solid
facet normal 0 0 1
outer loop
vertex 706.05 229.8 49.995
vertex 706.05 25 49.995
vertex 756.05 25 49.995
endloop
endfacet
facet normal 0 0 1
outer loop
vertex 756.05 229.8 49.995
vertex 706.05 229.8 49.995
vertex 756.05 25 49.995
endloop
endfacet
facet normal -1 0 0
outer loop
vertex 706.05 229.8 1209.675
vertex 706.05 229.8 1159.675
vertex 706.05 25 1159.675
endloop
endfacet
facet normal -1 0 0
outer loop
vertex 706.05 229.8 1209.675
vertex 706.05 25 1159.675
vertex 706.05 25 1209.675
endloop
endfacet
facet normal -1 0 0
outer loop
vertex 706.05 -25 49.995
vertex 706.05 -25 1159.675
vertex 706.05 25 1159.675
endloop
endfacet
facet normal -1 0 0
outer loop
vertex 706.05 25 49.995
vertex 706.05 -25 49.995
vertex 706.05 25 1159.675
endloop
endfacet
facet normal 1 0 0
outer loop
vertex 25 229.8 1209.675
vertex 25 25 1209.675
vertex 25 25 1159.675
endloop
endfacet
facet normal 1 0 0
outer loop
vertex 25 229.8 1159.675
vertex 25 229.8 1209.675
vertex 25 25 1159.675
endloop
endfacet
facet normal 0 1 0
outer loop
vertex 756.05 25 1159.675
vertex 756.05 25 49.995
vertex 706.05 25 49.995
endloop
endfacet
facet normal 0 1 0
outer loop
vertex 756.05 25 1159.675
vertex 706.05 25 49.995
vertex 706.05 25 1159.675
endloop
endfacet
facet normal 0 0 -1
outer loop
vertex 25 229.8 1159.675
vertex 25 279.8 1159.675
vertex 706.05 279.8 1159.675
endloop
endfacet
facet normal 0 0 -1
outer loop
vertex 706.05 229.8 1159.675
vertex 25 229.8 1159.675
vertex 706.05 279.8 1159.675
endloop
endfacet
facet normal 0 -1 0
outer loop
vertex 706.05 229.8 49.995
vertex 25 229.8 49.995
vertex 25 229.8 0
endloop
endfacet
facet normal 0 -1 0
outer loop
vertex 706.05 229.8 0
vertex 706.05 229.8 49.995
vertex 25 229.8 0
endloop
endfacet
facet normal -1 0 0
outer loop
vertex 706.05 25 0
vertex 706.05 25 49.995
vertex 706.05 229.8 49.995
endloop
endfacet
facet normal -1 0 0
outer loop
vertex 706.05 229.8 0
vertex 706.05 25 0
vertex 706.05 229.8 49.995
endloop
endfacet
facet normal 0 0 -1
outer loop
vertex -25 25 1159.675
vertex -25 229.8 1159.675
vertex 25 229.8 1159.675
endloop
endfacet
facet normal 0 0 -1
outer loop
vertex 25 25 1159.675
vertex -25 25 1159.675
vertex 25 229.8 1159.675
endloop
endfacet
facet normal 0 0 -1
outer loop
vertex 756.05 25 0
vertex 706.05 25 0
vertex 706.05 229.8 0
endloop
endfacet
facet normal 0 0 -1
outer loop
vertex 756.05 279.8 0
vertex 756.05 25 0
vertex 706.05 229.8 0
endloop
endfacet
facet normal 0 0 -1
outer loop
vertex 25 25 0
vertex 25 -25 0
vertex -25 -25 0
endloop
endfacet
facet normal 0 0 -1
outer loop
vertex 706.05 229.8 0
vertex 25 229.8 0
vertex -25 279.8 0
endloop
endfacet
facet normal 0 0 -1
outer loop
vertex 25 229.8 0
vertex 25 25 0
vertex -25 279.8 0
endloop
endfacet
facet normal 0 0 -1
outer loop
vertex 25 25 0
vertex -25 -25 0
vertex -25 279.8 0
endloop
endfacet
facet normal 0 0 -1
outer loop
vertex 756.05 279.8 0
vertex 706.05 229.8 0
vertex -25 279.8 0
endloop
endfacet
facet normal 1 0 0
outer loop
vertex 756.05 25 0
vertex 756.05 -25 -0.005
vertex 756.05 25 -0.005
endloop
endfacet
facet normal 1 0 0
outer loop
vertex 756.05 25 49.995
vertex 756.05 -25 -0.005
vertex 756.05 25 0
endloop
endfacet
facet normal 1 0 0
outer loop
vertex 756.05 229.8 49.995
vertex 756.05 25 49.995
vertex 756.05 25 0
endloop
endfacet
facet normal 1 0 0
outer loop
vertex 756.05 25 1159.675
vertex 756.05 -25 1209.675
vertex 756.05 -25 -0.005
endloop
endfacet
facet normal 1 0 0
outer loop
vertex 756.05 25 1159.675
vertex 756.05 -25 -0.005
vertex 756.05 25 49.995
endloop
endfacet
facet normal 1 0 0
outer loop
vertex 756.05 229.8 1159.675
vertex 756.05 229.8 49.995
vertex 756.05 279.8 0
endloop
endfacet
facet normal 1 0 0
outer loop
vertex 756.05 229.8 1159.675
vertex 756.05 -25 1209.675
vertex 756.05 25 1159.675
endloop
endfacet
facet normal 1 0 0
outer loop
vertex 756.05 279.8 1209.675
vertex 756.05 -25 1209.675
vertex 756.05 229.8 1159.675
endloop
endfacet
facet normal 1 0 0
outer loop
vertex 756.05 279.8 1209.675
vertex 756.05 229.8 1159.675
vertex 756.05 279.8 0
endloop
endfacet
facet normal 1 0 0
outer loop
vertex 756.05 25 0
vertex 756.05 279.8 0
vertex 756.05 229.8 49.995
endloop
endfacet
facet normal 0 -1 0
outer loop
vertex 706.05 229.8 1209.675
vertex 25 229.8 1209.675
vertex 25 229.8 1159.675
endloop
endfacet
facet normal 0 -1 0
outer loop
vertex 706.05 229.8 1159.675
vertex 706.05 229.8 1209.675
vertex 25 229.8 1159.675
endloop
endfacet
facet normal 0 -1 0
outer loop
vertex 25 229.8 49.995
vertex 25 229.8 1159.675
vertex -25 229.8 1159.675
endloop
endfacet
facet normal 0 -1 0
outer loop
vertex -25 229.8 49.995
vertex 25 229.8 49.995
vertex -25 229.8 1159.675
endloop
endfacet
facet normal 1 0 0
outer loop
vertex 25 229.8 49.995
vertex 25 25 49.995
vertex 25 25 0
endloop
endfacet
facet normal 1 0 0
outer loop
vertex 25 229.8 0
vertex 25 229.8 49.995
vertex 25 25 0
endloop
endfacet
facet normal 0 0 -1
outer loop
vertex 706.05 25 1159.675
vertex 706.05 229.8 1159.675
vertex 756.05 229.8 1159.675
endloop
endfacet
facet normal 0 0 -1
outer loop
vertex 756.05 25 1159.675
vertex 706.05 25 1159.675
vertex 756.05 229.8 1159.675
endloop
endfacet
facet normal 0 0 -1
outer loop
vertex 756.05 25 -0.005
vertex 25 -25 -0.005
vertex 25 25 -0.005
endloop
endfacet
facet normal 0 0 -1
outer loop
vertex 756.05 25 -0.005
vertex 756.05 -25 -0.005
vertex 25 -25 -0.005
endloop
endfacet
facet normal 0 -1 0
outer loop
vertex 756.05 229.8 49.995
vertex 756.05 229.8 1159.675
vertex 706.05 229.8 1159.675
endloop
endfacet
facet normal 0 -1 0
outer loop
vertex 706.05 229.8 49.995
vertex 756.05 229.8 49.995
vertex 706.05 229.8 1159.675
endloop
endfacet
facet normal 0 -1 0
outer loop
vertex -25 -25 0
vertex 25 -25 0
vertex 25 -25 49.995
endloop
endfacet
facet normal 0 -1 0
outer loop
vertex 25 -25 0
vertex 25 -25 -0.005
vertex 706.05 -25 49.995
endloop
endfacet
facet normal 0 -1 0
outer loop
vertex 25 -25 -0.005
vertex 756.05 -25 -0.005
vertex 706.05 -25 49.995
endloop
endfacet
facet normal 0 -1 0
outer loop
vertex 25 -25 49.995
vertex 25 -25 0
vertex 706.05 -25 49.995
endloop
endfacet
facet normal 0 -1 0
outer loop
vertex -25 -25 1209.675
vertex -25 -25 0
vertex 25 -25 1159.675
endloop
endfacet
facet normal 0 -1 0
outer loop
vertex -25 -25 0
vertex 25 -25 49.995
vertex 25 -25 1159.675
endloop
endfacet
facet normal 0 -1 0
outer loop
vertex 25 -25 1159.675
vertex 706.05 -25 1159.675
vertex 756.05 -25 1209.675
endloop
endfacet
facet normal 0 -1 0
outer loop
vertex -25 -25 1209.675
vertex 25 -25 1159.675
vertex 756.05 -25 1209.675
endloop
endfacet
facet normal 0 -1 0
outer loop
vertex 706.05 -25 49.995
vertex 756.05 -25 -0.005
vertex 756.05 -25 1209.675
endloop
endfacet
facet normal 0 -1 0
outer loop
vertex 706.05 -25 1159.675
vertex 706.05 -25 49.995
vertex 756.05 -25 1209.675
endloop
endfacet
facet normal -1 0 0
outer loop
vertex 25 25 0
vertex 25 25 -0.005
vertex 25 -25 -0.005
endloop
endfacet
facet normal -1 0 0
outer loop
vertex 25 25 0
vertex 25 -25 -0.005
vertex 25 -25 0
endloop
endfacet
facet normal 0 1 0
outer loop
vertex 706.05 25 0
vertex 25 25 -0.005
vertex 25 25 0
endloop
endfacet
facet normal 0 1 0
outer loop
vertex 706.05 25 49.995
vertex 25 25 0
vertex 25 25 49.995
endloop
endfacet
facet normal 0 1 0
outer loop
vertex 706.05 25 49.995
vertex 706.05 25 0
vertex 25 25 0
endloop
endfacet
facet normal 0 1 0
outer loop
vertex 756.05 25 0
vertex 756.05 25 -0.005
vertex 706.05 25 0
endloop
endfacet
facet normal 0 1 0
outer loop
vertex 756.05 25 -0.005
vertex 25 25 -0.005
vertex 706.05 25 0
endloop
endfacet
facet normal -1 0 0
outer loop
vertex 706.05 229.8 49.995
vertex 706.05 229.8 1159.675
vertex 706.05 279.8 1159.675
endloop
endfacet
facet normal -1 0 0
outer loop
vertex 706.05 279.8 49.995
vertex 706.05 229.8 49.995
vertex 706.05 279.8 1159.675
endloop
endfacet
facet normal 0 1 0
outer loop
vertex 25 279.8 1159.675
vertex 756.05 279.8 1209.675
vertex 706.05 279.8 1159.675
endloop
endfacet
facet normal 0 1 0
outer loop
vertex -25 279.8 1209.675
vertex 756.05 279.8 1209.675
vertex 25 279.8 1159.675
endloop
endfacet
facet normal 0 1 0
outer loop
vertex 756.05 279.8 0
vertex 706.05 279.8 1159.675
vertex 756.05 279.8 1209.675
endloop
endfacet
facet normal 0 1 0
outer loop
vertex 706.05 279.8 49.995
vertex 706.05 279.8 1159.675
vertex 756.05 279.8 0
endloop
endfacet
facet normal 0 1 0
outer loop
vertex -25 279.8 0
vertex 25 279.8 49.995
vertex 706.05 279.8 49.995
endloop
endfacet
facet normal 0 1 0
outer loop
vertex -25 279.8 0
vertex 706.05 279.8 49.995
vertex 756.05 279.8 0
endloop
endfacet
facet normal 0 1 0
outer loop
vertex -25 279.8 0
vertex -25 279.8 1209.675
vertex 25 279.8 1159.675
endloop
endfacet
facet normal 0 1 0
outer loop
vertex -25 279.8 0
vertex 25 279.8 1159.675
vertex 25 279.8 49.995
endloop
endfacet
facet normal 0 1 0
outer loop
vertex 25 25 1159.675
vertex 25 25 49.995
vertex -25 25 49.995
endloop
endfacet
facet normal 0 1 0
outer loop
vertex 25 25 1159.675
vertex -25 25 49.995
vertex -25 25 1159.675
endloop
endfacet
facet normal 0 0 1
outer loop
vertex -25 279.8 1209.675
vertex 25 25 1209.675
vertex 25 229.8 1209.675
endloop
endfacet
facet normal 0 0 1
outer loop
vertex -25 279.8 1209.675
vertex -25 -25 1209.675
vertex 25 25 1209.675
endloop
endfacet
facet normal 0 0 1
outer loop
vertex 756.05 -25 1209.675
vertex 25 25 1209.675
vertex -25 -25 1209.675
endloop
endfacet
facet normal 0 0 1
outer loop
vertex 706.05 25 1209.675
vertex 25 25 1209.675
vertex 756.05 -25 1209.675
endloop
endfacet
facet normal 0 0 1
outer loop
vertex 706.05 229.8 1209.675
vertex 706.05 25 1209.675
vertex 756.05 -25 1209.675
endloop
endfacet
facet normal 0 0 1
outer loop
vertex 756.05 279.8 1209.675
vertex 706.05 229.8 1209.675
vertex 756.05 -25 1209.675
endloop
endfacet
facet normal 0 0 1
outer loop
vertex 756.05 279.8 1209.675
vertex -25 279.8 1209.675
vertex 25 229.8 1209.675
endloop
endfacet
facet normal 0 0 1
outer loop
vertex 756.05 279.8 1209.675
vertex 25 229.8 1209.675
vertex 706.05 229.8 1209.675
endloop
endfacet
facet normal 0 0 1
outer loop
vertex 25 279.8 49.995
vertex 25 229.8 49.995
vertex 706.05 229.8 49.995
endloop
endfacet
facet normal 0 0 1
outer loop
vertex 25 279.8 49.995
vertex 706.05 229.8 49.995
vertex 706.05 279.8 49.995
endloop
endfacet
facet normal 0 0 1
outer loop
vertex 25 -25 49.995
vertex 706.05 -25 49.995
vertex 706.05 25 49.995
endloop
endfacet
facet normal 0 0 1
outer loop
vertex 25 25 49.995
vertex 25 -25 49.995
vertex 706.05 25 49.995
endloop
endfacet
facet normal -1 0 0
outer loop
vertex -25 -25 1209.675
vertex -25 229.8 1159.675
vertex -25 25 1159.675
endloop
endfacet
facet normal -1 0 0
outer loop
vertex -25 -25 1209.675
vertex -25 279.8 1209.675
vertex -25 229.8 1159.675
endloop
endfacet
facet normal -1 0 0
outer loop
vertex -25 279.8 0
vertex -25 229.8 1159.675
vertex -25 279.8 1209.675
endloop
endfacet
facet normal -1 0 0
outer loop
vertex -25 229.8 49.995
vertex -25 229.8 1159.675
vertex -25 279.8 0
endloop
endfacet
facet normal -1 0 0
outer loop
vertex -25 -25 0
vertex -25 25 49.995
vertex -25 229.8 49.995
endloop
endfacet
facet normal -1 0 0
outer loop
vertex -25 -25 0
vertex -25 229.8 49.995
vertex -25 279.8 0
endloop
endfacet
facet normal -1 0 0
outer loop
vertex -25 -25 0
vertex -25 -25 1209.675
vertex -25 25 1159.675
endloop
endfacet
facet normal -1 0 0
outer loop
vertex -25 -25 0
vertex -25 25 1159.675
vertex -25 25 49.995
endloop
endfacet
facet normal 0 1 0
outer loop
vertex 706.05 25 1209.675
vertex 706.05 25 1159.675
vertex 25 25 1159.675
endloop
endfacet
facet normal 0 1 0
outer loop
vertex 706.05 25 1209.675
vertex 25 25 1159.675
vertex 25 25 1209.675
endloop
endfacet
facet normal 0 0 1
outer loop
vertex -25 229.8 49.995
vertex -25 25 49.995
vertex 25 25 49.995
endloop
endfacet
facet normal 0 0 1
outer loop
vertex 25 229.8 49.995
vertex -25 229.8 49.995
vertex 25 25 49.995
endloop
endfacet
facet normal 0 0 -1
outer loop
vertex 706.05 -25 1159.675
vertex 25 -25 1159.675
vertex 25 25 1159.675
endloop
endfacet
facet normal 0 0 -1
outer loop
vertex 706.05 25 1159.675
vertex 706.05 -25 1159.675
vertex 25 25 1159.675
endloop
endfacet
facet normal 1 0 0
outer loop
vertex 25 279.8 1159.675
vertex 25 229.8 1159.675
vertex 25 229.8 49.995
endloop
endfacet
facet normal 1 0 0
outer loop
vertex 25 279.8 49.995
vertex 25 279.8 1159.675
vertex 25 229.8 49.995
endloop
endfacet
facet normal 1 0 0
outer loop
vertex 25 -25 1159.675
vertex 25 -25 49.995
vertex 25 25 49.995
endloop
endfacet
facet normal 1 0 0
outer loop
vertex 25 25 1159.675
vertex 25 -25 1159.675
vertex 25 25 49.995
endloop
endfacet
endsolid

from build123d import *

# Parameters (mm, degrees)
SKETCH2_W            = 50
SKETCH2_H            = 50
BOSS_EXTRUDE1_DEPTH  = 1209.675
SKETCH3_W            = 50
SKETCH3_H            = 50
BOSS_EXTRUDE2_DEPTH  = 731.05
SKETCH4_W            = 50
SKETCH4_H            = 50
BOSS_EXTRUDE3_DEPTH  = 1159.68
SKETCH6_W            = 50
SKETCH6_H            = 50
BOSS_EXTRUDE4_DEPTH  = 681.05
SKETCH8_W            = 50
SKETCH8_H            = 50
BOSS_EXTRUDE5_DEPTH  = 254.8
SKETCH9_W            = 50
SKETCH9_H            = 50
BOSS_EXTRUDE6_DEPTH  = 731.05
SKETCH10_W           = 50
SKETCH10_H           = 50
BOSS_EXTRUDE7_DEPTH  = 204.8
SKETCH11_W           = 50
SKETCH11_H           = 49.995
BOSS_EXTRUDE8_DEPTH  = 254.8
SKETCH12_W           = 50
SKETCH12_H           = 50
BOSS_EXTRUDE9_DEPTH  = 1109.8
SKETCH13_W           = 50
SKETCH13_H           = 50
BOSS_EXTRUDE10_DEPTH = 1109.8
SKETCH14_W           = 50
SKETCH14_H           = 49.995
BOSS_EXTRUDE11_DEPTH = 254.8
SKETCH15_W           = 49.995
SKETCH15_H           = 50
BOSS_EXTRUDE12_DEPTH = 681.05


with BuildPart() as part:
    # Sketch2 → Boss-Extrude1 (new body)
    with BuildSketch(Plane.XY):
        Rectangle(SKETCH2_W, SKETCH2_H)
    extrude(amount=BOSS_EXTRUDE1_DEPTH)

    # Sketch3 → Boss-Extrude2 (add)
    with BuildSketch(Plane(origin=(25, 0, 0), x_dir=(0, 0, -1), z_dir=(1, 0, 0))):
        with Locations((-1184.675, 0)):
            Rectangle(SKETCH3_W, SKETCH3_H)
    extrude(amount=BOSS_EXTRUDE2_DEPTH)

    # Sketch4 → Boss-Extrude3 (add)
    with BuildSketch(Plane(origin=(0, 0, 1159.675), x_dir=(-1, 0, 0), z_dir=(0, 0, -1))):
        with Locations((-731.05, 0)):
            Rectangle(SKETCH4_W, SKETCH4_H)
    extrude(amount=BOSS_EXTRUDE3_DEPTH)

    # Sketch6 → Boss-Extrude4 (add)
    with BuildSketch(Plane.ZY.offset(-706.05)):
        with Locations((24.995, 0)):
            Rectangle(SKETCH6_W, SKETCH6_H)
    extrude(amount=BOSS_EXTRUDE4_DEPTH)

    # Sketch8 → Boss-Extrude5 (add)
    with BuildSketch(Plane(origin=(0, 25, 0), x_dir=(1, 0, 0), z_dir=(0, 1, 0))):
        with Locations((0, -1184.675)):
            Rectangle(SKETCH8_W, SKETCH8_H)
    extrude(amount=BOSS_EXTRUDE5_DEPTH)

    # Sketch9 → Boss-Extrude6 (add)
    with BuildSketch(Plane(origin=(25, 0, 0), x_dir=(0, 0, -1), z_dir=(1, 0, 0))):
        with Locations((-1184.675, 254.8)):
            Rectangle(SKETCH9_W, SKETCH9_H)
    extrude(amount=BOSS_EXTRUDE6_DEPTH)

    # Sketch10 → Boss-Extrude7 (add)
    with BuildSketch(Plane.XZ.offset(-229.8)):
        with Locations((731.05, 1184.675)):
            Rectangle(SKETCH10_W, SKETCH10_H)
    extrude(amount=BOSS_EXTRUDE7_DEPTH)

    # Sketch11 → Boss-Extrude8 (add)
    with BuildSketch(Plane(origin=(0, 25, 0), x_dir=(1, 0, 0), z_dir=(0, 1, 0))):
        with Locations((731.05, -24.9975)):
            Rectangle(SKETCH11_W, SKETCH11_H)
    extrude(amount=BOSS_EXTRUDE8_DEPTH)

    # Sketch12 → Boss-Extrude9 (add)
    with BuildSketch(Plane(origin=(0, 0, 1159.675), x_dir=(-1, 0, 0), z_dir=(0, 0, -1))):
        with Locations((-731.05, 254.8)):
            Rectangle(SKETCH12_W, SKETCH12_H)
    extrude(amount=BOSS_EXTRUDE9_DEPTH)

    # Sketch13 → Boss-Extrude10 (add)
    with BuildSketch(Plane(origin=(0, 0, 1159.675), x_dir=(-1, 0, 0), z_dir=(0, 0, -1))):
        with Locations((0, 254.8)):
            Rectangle(SKETCH13_W, SKETCH13_H)
    extrude(amount=BOSS_EXTRUDE10_DEPTH)

    # Sketch14 → Boss-Extrude11 (add)
    with BuildSketch(Plane(origin=(0, 25, 0), x_dir=(1, 0, 0), z_dir=(0, 1, 0))):
        with Locations((0, -24.9975)):
            Rectangle(SKETCH14_W, SKETCH14_H)
    extrude(amount=BOSS_EXTRUDE11_DEPTH)

    # Sketch15 → Boss-Extrude12 (add)
    with BuildSketch(Plane(origin=(25, 0, 0), x_dir=(0, 0, -1), z_dir=(1, 0, 0))):
        with Locations((-24.9975, 254.8)):
            Rectangle(SKETCH15_W, SKETCH15_H)
    extrude(amount=BOSS_EXTRUDE12_DEPTH)


solid = part.part
